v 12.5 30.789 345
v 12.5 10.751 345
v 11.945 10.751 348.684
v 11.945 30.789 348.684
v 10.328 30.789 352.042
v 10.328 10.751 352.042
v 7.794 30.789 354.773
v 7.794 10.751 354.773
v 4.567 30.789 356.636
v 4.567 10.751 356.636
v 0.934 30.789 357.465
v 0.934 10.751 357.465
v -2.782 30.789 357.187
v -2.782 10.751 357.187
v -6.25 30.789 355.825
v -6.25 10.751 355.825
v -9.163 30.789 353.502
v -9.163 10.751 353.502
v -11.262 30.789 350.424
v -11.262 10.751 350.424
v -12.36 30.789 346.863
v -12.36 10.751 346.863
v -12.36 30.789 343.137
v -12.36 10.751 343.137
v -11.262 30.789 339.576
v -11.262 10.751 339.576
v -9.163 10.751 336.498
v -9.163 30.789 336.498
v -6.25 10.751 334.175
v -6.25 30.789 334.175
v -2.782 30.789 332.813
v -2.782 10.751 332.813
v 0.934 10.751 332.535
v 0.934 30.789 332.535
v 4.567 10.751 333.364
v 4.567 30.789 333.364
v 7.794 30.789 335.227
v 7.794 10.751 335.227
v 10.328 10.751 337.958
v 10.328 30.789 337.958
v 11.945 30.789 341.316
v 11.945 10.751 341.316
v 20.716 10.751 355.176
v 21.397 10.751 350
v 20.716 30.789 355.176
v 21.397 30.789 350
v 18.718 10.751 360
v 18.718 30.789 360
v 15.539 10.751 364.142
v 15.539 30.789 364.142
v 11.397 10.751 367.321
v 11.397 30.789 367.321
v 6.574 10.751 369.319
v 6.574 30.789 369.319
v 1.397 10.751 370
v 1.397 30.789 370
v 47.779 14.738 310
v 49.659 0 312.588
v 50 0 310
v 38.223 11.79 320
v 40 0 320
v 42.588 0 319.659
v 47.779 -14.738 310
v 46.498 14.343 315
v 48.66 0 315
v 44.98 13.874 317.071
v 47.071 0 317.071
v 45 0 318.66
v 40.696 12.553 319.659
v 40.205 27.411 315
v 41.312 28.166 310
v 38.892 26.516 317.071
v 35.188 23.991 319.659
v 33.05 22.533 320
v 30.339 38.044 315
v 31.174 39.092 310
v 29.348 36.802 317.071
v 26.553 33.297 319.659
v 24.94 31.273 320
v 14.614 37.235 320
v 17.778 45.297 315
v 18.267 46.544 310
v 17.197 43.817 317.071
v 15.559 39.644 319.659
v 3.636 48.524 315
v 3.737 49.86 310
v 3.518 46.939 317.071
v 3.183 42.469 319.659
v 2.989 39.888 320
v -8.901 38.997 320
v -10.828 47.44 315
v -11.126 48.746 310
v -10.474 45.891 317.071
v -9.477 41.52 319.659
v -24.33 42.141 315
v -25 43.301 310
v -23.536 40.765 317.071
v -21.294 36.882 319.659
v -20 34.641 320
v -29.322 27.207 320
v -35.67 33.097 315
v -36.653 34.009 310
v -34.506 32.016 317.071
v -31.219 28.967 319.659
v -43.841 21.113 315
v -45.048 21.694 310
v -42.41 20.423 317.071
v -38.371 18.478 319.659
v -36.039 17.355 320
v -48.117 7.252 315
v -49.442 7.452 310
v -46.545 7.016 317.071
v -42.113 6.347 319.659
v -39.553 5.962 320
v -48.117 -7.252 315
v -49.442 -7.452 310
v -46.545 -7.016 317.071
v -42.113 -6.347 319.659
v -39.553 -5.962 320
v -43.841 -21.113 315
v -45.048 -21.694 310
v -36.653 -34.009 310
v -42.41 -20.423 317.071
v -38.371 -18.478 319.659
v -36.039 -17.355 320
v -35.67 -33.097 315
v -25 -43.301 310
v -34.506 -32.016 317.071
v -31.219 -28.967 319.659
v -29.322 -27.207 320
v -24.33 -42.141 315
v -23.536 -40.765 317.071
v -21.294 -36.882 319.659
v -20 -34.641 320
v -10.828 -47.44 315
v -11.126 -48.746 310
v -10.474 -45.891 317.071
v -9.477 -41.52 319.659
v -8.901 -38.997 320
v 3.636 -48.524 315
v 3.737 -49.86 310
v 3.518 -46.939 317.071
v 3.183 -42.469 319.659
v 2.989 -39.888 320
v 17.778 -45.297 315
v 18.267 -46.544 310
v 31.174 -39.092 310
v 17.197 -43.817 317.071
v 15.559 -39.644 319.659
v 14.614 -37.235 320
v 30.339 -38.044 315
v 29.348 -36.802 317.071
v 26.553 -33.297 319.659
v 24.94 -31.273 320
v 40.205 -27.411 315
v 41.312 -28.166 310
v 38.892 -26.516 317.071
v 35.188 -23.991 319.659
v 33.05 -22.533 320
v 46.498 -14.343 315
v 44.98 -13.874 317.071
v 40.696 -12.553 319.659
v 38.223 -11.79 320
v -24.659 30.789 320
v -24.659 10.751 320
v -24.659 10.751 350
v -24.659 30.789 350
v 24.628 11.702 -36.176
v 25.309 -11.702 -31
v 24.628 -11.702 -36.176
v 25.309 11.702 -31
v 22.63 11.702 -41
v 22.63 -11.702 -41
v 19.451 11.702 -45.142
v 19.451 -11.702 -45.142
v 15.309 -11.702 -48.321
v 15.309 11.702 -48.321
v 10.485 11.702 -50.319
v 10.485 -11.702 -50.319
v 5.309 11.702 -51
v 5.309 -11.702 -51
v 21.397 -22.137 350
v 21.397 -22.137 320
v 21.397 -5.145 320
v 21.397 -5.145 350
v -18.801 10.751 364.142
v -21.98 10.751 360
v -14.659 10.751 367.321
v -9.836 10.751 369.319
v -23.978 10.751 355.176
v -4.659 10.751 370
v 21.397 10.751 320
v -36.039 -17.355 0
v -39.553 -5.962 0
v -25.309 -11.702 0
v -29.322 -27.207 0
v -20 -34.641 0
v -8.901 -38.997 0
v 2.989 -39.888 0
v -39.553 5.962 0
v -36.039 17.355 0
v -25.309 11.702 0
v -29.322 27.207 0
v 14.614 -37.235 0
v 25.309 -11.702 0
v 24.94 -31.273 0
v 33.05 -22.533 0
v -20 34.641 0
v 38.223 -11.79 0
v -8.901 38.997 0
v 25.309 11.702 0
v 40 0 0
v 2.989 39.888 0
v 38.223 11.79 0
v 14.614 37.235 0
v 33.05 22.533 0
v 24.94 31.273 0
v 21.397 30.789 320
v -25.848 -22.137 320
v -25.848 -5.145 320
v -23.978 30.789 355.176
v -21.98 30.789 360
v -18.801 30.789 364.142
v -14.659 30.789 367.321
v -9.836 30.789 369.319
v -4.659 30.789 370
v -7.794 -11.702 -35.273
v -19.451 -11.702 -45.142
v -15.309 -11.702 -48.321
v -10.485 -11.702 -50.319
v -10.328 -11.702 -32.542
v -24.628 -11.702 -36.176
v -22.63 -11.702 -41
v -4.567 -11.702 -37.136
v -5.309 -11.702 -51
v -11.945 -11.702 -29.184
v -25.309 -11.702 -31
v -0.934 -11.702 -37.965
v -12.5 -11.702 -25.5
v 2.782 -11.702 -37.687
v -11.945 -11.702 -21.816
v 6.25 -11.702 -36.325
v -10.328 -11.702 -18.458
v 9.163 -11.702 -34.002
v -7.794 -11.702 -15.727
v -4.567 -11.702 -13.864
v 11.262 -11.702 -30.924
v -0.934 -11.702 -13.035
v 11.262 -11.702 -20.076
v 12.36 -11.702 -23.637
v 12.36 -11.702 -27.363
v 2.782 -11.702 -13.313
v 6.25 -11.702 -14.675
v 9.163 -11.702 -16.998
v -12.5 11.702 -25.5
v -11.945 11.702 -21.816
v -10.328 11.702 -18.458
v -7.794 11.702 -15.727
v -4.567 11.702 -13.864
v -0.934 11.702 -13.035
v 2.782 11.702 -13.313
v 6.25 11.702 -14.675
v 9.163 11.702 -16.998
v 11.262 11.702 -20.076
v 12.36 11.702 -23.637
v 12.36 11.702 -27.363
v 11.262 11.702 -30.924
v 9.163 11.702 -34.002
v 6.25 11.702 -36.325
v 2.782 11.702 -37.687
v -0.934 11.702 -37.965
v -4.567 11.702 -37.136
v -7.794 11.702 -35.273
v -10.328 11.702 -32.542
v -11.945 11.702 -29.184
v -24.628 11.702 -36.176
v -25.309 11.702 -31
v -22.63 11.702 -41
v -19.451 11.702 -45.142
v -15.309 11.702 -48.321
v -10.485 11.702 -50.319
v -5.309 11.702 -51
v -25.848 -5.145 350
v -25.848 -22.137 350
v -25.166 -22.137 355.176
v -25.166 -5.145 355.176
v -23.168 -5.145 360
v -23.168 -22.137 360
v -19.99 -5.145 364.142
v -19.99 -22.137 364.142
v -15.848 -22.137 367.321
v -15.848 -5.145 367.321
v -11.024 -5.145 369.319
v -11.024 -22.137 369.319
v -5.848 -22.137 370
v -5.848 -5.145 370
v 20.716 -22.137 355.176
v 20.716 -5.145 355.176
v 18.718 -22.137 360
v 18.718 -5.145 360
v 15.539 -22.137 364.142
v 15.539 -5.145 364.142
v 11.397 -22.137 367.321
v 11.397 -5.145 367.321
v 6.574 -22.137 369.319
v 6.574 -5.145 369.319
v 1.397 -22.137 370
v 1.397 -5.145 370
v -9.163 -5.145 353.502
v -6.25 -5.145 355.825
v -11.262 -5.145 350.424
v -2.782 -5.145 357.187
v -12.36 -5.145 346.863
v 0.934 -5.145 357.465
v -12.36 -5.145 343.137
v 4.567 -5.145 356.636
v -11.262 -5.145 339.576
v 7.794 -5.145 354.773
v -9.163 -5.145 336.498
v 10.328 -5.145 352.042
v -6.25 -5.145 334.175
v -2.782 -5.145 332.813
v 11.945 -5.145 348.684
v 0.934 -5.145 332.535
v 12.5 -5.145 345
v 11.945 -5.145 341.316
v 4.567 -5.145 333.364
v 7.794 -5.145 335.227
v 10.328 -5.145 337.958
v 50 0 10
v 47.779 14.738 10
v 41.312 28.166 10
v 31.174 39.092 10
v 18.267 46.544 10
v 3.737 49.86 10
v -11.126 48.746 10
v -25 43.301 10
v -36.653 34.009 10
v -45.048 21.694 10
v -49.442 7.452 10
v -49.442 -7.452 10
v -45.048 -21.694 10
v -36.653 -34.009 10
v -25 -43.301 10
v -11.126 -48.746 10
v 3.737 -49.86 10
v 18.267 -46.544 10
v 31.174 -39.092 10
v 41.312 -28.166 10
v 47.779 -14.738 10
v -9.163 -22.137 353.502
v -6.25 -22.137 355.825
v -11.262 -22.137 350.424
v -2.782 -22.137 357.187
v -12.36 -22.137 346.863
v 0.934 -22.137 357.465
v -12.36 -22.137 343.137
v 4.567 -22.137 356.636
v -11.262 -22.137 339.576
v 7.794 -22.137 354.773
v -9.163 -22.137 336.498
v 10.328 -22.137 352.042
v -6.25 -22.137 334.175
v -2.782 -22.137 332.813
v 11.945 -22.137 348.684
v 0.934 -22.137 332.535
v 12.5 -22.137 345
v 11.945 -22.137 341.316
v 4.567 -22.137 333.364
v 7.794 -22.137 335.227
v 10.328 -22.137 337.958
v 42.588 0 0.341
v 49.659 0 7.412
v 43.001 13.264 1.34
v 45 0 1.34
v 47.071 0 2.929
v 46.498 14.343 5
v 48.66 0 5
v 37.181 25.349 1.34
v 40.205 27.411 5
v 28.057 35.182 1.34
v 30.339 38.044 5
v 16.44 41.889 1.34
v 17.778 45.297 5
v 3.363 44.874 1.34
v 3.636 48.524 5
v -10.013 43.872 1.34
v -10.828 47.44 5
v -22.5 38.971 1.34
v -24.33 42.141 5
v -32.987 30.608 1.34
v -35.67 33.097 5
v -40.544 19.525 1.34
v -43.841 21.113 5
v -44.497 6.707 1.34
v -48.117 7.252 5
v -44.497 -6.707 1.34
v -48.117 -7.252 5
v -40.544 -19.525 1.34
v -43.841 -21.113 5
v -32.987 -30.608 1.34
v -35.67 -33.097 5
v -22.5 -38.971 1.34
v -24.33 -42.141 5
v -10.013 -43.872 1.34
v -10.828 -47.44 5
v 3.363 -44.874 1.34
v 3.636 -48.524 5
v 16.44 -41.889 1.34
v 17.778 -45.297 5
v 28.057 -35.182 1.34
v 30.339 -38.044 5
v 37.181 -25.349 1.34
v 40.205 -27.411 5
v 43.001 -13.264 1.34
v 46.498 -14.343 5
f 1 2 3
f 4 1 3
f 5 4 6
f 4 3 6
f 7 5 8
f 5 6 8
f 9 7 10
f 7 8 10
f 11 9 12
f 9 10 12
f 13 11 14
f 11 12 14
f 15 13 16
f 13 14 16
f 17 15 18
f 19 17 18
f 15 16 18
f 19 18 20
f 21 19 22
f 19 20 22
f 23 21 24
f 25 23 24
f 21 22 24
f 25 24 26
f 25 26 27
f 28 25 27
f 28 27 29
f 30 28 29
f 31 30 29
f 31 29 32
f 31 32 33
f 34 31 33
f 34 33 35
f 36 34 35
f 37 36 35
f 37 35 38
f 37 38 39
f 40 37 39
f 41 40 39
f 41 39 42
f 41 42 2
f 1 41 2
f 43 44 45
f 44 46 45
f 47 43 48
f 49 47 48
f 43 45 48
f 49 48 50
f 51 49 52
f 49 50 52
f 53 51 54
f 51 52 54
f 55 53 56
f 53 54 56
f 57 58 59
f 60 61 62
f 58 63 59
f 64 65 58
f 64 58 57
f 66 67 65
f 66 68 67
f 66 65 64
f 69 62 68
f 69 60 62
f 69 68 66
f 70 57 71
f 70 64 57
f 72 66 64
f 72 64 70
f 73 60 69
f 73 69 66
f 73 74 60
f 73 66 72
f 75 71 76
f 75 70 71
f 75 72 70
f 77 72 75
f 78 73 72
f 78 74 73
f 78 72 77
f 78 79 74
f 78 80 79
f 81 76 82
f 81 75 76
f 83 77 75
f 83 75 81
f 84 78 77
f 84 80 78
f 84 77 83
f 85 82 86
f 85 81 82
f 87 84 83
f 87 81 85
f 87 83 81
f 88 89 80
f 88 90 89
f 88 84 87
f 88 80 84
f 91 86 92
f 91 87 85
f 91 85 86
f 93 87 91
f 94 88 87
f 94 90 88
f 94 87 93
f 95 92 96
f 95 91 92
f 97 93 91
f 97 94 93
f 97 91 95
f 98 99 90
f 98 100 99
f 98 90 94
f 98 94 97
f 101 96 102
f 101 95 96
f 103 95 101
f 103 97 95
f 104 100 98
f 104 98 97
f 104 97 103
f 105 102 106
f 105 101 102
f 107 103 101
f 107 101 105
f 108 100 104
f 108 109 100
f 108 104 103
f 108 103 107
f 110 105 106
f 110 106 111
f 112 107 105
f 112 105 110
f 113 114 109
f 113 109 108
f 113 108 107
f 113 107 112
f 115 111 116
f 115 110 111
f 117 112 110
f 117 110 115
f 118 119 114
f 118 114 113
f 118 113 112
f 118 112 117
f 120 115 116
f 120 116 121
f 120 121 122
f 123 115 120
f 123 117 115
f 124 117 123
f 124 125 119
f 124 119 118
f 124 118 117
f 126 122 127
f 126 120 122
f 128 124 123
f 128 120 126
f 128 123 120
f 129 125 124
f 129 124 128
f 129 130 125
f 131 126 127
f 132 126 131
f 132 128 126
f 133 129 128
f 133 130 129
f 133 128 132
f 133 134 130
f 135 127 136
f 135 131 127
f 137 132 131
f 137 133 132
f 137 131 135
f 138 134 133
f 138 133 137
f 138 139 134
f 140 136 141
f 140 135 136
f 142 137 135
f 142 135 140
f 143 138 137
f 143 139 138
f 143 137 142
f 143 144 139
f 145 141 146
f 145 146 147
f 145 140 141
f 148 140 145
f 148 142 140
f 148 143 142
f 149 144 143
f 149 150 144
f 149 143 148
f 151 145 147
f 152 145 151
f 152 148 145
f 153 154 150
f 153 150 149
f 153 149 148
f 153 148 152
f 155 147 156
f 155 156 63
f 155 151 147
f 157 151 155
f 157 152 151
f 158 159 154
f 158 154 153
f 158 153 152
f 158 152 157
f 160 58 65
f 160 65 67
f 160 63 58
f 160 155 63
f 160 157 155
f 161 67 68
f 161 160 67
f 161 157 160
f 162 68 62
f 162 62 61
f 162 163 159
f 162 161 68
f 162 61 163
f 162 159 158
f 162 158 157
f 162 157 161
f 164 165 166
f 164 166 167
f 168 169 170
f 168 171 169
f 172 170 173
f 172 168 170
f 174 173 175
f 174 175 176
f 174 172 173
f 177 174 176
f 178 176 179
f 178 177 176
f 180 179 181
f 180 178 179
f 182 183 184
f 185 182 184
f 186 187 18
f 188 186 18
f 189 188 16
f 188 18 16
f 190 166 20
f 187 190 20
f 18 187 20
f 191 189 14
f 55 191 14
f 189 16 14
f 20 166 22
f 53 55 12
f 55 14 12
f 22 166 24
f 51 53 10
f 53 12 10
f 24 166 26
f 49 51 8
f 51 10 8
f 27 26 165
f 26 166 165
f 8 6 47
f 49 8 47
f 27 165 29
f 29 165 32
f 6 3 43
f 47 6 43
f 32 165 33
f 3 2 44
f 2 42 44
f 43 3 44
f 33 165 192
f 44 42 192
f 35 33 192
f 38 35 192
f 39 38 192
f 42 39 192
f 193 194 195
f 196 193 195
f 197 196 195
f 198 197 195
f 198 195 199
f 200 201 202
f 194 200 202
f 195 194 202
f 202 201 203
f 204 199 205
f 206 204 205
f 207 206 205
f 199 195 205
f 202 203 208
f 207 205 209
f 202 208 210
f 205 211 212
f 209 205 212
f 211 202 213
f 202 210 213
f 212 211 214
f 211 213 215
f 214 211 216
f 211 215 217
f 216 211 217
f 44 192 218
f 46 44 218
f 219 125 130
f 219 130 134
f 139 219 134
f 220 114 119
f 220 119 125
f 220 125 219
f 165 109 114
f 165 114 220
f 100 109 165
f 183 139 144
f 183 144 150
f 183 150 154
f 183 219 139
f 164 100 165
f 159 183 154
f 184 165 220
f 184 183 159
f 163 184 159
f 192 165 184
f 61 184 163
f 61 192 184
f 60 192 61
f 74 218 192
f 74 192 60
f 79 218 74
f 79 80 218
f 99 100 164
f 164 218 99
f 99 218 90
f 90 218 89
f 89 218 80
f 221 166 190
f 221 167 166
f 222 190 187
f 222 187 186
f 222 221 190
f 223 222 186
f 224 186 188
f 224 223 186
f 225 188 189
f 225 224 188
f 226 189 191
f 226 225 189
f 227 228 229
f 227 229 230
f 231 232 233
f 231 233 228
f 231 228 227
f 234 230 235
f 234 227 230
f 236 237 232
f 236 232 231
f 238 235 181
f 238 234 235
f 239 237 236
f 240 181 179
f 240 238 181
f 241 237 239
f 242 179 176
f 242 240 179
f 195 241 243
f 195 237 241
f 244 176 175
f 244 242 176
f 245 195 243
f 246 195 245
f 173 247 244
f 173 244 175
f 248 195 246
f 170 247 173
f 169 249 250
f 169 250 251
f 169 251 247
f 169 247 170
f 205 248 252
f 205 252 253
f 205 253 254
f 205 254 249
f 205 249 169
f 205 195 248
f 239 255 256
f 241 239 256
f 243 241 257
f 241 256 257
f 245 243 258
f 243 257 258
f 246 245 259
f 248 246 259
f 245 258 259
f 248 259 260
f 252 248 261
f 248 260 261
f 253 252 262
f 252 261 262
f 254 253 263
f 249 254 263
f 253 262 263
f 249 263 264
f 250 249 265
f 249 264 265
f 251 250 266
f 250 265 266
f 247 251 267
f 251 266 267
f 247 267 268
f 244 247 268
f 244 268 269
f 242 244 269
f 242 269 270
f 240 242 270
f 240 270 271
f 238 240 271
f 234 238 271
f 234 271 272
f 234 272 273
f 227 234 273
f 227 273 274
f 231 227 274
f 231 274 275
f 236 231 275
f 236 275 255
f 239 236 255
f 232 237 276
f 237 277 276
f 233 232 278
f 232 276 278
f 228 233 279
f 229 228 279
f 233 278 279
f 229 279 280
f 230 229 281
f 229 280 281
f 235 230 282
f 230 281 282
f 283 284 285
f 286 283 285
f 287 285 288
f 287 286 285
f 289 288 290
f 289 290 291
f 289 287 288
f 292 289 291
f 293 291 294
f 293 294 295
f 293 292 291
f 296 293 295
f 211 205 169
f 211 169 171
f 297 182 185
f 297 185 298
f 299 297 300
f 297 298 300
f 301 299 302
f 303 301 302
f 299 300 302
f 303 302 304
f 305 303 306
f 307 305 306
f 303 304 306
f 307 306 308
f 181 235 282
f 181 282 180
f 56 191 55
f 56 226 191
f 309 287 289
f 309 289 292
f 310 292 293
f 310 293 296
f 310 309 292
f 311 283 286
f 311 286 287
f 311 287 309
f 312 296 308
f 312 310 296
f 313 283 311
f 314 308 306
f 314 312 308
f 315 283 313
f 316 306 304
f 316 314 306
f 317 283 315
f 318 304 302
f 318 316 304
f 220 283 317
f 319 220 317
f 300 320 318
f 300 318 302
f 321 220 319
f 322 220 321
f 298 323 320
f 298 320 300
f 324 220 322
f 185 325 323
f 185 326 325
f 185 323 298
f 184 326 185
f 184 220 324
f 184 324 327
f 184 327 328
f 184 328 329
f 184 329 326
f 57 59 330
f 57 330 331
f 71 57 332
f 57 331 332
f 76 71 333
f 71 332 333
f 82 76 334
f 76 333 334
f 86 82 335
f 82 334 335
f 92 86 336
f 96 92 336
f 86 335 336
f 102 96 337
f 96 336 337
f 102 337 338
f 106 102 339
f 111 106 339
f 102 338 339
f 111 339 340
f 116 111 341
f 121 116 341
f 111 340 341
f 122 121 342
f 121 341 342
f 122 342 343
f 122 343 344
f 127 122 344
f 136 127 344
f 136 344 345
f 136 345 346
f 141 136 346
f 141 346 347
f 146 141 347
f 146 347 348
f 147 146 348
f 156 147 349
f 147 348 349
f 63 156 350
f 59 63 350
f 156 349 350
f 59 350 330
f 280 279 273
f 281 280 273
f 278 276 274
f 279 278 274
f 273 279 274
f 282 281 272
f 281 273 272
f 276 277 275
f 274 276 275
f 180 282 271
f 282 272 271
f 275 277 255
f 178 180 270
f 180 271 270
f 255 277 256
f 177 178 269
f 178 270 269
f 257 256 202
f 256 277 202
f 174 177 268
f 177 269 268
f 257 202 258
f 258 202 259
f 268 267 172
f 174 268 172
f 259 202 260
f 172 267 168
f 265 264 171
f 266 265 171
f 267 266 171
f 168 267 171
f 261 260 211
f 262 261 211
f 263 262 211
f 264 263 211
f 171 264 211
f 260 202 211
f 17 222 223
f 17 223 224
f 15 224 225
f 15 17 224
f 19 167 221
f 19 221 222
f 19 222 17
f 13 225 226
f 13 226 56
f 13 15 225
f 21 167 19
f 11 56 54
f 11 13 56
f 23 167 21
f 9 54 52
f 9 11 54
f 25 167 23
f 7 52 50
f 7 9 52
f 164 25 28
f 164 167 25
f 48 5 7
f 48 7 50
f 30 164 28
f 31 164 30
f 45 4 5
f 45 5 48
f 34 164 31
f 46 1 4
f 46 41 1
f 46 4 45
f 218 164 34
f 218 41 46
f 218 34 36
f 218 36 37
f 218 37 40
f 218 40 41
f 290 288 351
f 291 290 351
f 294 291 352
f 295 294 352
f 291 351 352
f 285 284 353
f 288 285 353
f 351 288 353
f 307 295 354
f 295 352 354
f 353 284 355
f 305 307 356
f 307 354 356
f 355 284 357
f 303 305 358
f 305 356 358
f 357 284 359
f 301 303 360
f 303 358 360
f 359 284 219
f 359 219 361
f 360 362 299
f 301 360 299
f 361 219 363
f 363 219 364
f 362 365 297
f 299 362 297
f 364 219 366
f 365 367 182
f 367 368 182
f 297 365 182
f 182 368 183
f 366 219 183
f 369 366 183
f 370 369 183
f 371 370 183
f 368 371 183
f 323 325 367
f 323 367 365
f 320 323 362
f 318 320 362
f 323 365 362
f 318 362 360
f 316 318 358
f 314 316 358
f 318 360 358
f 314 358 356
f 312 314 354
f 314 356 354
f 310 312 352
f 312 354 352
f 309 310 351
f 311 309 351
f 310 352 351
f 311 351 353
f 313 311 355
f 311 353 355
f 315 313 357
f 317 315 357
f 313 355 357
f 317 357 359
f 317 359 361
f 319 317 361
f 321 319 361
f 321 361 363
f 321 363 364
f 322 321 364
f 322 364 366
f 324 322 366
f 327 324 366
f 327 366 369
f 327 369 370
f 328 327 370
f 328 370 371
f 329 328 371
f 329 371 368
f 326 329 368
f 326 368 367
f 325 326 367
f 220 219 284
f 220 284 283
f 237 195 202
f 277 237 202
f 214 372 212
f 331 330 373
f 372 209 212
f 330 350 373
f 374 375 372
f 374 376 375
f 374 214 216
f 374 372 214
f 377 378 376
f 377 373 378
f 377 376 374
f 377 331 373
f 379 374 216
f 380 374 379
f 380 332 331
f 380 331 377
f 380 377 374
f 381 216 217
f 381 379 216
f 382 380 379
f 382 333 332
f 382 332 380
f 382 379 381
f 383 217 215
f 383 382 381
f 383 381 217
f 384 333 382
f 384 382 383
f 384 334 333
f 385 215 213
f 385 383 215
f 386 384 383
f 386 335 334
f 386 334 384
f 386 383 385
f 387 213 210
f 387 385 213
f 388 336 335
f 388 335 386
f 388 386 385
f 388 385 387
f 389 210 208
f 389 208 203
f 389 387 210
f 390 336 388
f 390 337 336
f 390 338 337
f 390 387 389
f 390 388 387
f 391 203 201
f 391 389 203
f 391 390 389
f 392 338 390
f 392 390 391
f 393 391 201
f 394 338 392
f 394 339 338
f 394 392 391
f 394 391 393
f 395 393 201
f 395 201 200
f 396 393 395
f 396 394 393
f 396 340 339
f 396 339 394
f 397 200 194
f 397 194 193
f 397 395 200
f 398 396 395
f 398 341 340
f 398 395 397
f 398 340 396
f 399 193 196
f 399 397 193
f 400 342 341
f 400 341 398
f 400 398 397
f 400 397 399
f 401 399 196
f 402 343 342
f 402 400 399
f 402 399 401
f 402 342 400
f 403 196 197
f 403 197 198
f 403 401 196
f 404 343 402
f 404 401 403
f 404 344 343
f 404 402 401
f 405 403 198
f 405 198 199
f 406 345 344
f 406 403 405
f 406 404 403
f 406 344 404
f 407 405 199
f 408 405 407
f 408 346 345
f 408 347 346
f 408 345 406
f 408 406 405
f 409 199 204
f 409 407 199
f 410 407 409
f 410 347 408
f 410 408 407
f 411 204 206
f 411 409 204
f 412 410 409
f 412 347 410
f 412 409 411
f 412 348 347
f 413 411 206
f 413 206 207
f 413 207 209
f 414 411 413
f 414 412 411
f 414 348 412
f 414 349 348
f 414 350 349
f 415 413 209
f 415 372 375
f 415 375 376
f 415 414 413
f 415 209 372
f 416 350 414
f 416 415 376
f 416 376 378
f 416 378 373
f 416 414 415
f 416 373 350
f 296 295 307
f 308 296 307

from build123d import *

# Parameters (mm, degrees)
F0_R     = 50
F1_DEPTH = 320
F2_W     = 47.244698
F2_H     = 16.991875
F2_W_2   = 46.056544
F2_H_2   = 20.037373
F3_DEPTH = 50
F4_R     = 12.5
F5_DEPTH = 72.138193
F6_W     = 50.61818
F6_H     = 23.403664
F7_DEPTH = 51
F8_R     = 12.5
F9_DEPTH = 61.702832
F10_R    = 20
F11_R    = 10


with BuildPart() as f1:
    # F0 (on Top) → F1 (new body)
    with BuildSketch(Plane.XY):
        Circle(F0_R)
    extrude(amount=F1_DEPTH)

    # F2 (on face) → F3 (join)
    with BuildSketch(Plane.XY.offset(320)):
        with Locations((-2.225159, -13.641255)):
            Rectangle(F2_W, F2_H)
        with Locations((-1.631082, 20.769891)):
            Rectangle(F2_W_2, F2_H_2)
    extrude(amount=F3_DEPTH)

    # F4 (on face) → F5 (cut, through all)
    with BuildSketch(Plane.XZ.offset(22.137193)):
        with Locations((0, 345)):
            Circle(F4_R)
    extrude(amount=-F5_DEPTH, mode=Mode.SUBTRACT)

    # F6 (on Top) → F7 (join)
    with BuildSketch(Plane.XY):
        Rectangle(F6_W, F6_H)
    extrude(amount=-F7_DEPTH)

    # F8 (on face) → F9 (cut, through all)
    with BuildSketch(Plane(origin=(0, 11.701832, 0), x_dir=(-1, 0, 0), z_dir=(0, 1, 0))):
        with Locations((0, -25.5)):
            Circle(F8_R)
    extrude(amount=-F9_DEPTH, mode=Mode.SUBTRACT)

    # F10
    f10_edges = [f1.edges().sort_by_distance(p)[0] for p in [
        (21.39719, -13.641255, 370),
        (21.39719, 20.769892, 370),
        (-24.659354, 20.769892, 370),
        (-25.847508, -13.641255, 370),
        (25.30909, 0, -51),
        (-25.30909, 0, -51),
    ]]
    fillet(f10_edges, radius=F10_R)

    # F11
    f11_edges = [f1.edges().sort_by_distance(p)[0] for p in [
        (-50, 0, 0),
        (-50, 0, 320),
    ]]
    fillet(f11_edges, radius=F11_R)


solid = f1.part
